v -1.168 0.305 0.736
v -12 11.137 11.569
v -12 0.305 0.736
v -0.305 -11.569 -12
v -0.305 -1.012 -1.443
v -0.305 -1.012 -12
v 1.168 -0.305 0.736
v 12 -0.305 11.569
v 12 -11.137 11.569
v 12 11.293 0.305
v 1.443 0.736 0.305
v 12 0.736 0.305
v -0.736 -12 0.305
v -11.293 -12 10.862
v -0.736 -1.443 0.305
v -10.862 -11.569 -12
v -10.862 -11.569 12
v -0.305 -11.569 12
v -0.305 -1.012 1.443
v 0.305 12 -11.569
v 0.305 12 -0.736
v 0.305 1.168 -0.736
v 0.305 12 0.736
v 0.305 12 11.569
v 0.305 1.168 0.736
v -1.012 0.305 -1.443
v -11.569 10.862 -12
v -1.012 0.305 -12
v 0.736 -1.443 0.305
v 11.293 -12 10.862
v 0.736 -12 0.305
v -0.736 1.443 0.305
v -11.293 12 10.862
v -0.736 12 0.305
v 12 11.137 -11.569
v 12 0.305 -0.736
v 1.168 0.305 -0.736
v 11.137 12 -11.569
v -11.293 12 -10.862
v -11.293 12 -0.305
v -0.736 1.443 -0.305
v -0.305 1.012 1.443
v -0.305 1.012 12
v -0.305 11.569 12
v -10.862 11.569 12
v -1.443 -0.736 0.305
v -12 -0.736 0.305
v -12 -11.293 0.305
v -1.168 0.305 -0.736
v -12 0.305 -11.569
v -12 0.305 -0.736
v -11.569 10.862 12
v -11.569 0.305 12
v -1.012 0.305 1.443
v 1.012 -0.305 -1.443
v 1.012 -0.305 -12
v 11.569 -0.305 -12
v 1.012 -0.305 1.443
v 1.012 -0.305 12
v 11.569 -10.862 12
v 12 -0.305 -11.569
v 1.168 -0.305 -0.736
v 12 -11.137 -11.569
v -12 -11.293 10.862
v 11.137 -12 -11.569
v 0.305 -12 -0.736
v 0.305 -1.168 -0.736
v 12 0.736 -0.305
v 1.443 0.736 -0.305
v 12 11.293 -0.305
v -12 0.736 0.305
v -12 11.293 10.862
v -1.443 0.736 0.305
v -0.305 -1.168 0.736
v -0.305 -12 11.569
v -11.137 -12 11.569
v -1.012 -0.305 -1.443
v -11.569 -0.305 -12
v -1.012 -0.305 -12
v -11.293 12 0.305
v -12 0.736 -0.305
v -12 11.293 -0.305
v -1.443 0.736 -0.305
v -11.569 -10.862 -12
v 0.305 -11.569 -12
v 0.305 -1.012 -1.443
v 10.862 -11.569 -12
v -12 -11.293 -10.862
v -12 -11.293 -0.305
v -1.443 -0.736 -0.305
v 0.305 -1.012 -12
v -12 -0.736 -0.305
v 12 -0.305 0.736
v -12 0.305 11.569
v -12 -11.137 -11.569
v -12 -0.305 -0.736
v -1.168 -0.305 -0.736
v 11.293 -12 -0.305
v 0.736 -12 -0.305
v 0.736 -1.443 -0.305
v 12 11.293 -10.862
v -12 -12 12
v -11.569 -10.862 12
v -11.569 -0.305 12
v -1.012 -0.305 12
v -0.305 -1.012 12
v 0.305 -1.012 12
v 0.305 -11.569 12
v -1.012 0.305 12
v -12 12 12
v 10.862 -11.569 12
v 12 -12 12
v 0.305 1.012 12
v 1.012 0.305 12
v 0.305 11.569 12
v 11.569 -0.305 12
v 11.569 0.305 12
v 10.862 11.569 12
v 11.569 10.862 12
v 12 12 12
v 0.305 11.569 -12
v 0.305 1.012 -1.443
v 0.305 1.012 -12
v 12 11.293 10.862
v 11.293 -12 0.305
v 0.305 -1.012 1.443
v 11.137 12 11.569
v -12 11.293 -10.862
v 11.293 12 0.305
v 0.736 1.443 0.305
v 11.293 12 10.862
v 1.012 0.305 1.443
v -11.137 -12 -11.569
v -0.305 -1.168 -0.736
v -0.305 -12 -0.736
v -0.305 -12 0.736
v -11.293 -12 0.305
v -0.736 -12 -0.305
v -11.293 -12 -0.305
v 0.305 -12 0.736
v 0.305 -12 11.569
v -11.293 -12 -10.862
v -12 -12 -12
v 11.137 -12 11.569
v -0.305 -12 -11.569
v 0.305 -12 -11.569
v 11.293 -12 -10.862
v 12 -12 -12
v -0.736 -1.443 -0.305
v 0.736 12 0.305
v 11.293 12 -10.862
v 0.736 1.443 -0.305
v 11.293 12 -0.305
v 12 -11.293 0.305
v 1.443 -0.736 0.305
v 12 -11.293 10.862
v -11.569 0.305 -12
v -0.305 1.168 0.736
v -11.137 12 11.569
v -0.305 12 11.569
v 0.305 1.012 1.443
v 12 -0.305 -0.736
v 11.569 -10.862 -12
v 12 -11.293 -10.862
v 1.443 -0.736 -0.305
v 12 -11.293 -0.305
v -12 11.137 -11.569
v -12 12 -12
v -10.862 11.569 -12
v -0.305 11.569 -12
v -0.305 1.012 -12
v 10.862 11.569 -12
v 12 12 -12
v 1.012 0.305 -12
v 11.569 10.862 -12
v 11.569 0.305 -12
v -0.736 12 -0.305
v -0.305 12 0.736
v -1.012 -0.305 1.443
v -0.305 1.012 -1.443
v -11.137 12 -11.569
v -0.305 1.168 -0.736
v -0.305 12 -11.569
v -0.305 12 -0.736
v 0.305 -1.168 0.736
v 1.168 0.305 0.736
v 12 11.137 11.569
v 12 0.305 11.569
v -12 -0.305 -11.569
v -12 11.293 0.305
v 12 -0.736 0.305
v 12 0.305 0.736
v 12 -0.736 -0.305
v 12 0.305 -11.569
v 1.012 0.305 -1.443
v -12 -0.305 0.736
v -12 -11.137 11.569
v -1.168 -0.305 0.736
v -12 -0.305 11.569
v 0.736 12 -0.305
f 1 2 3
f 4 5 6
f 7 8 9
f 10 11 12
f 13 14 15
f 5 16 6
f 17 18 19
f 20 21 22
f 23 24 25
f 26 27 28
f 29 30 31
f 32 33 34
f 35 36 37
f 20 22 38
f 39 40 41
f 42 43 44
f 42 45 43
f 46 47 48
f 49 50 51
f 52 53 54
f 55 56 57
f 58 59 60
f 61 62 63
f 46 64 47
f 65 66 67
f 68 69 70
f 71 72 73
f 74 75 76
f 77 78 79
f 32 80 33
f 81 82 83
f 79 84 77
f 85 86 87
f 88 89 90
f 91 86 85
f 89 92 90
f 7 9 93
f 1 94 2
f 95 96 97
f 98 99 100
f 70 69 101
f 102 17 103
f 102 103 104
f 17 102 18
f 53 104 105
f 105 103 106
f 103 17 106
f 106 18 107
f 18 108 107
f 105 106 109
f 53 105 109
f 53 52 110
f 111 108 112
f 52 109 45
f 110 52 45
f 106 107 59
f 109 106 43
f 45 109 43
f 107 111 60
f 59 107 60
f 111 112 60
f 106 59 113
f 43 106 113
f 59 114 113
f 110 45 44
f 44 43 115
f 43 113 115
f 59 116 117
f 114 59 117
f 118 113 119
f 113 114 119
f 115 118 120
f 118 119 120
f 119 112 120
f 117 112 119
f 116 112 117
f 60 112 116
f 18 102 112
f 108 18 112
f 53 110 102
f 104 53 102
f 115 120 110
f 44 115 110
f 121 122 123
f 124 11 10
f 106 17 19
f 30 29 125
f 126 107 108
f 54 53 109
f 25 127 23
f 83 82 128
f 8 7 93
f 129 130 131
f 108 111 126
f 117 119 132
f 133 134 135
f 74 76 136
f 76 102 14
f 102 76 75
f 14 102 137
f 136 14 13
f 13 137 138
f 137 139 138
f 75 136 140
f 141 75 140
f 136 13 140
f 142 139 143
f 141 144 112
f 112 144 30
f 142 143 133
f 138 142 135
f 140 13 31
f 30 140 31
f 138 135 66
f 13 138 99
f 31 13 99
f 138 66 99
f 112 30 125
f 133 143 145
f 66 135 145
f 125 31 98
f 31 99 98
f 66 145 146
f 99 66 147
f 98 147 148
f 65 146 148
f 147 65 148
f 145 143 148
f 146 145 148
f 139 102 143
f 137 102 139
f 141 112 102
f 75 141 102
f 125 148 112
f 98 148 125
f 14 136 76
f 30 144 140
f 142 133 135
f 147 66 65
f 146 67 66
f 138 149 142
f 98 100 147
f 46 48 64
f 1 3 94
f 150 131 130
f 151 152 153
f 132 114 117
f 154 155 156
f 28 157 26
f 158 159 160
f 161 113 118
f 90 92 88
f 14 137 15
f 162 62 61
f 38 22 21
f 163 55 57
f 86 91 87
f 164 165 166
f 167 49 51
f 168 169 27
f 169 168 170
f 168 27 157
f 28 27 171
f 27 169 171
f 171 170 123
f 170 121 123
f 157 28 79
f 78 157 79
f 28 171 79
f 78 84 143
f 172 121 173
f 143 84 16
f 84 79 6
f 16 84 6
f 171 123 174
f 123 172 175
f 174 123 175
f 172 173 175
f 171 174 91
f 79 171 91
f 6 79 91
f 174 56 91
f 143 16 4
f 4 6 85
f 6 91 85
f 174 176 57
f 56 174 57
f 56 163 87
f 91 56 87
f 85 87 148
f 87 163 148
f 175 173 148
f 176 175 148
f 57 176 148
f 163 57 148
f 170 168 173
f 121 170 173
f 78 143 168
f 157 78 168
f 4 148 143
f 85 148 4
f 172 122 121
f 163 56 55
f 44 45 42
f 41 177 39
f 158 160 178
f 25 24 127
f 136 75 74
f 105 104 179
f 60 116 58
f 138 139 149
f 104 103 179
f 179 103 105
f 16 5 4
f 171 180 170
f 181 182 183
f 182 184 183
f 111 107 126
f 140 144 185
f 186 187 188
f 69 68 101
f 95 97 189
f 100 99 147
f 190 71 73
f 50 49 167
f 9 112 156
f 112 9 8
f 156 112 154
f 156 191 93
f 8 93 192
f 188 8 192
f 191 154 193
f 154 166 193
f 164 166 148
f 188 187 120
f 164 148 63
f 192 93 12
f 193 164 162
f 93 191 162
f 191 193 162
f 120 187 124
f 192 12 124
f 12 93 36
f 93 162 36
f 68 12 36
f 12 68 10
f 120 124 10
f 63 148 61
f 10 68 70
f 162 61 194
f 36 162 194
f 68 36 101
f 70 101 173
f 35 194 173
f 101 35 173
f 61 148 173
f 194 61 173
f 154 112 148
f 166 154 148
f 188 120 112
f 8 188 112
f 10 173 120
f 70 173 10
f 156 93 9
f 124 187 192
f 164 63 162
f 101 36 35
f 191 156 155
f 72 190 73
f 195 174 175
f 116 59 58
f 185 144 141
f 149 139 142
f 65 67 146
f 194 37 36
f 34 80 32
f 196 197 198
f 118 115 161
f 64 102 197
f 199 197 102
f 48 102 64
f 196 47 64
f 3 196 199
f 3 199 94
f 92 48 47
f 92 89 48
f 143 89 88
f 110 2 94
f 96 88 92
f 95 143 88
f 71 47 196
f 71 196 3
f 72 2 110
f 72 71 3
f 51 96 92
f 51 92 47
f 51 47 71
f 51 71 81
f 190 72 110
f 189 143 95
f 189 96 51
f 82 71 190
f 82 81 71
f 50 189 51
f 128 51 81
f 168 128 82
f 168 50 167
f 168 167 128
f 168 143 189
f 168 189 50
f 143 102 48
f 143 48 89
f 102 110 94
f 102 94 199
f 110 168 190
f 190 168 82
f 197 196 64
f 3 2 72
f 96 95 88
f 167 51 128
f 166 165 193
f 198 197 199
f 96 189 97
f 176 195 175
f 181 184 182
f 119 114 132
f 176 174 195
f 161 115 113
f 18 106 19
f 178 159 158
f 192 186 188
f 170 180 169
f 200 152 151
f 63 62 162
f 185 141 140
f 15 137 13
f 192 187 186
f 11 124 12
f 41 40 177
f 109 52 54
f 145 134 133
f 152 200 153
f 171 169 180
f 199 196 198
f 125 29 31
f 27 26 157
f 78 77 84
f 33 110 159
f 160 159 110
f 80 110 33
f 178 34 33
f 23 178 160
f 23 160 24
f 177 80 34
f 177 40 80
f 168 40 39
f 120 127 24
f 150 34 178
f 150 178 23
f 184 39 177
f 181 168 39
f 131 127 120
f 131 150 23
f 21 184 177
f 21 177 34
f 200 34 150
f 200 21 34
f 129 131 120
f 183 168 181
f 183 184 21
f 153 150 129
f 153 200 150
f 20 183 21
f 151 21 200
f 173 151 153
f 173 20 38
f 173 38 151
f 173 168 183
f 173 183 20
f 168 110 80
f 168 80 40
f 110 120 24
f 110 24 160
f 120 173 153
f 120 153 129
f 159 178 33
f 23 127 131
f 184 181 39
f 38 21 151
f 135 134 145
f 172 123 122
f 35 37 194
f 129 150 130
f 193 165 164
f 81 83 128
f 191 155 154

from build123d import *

# Parameters (mm, degrees)
SKETCH2_W               = 25
SKETCH2_H               = 25
BOSS_EXTRUDE1_DEPTH     = 0.305
SKETCH3_W               = 25
SKETCH3_H               = 25
BOSS_EXTRUDE2_DEPTH     = 0.305
SKETCH4_W               = 25
SKETCH4_H               = 25
BOSS_EXTRUDE3_DEPTH     = 0.305
BOSS_EXTRUDE4_DEPTH     = 0.305
CIRPATTERN1_COUNT       = 4
BOSS_EXTRUDE5_DEPTH     = 0.5
CIRPATTERN3_COUNT       = 4
CUT_EXTRUDE1_DEPTH      = 32.084683695
CUT_EXTRUDE1_DEPTH_BACK = 32.084683695
SKETCH10_W              = 32.20248022
SKETCH10_H              = 30.281091186
SKETCH10_W_2            = 24
SKETCH10_H_2            = 24
SKETCH11_W              = 28.880121396
SKETCH11_H              = 26.658573596
SKETCH11_W_2            = 24
SKETCH11_H_2            = 24
CUT_EXTRUDE2_DEPTH      = 37


with BuildPart() as part:
    # Sketch2 → Boss-Extrude1 (new, symmetric)
    with BuildSketch(Plane.XY):
        Rectangle(SKETCH2_W, SKETCH2_H)
    extrude(amount=BOSS_EXTRUDE1_DEPTH, both=True)

    # Sketch3 → Boss-Extrude2 (add, symmetric)
    with BuildSketch(Plane(origin=(0, 0, 0), x_dir=(1, 0, 0), z_dir=(0, 1, 0))):
        Rectangle(SKETCH3_W, SKETCH3_H)
    extrude(amount=BOSS_EXTRUDE2_DEPTH, both=True)

    # Sketch4 → Boss-Extrude3 (add, symmetric)
    with BuildSketch(Plane(origin=(0, 0, 0), x_dir=(0, 0, -1), z_dir=(1, 0, 0))):
        Rectangle(SKETCH4_W, SKETCH4_H)
    extrude(amount=BOSS_EXTRUDE3_DEPTH, both=True)

    # 3DSketch1 → Boss-Extrude4 (add, symmetric)
    with BuildSketch(Plane(origin=(12.5, 12.5, -12.5), x_dir=(-0.5773502691896257, -0.5773502691896257, 0.5773502691896257), z_dir=(0.7071067811865476, 0, 0.7071067811865475))):
        Polygon((0, 0), (14.43375673, 20.412414523), (43.301270189, 0), (28.867513459, -20.412414523), align=None)
    boss_extrude4 = extrude(amount=BOSS_EXTRUDE4_DEPTH, both=True)

    # CirPattern1: Boss-Extrude4 ×4 about axis
    cirpattern1_axis = Axis((0, 0, -14.139022115), (0, 0, 1))
    for i in range(1, CIRPATTERN1_COUNT):
        add(boss_extrude4.rotate(cirpattern1_axis, i * 360 / CIRPATTERN1_COUNT))


with BuildPart() as body_2:
    # 3DSketch2 → Boss-Extrude5 (new, symmetric)
    with BuildSketch(Plane(origin=(12.5, -12.5, -12.5), x_dir=(-0.5773502691896257, 0.5773502691896257, 0.5773502691896257), z_dir=(-0.7071067811865476, -0.7071067811865476, 0))):
        Polygon((0, 0), (28.867513459, 20.412414523), (43.301270189, 0), (14.43375673, -20.412414523), align=None)
    boss_extrude5 = extrude(amount=BOSS_EXTRUDE5_DEPTH, both=True)

    # CirPattern3: Boss-Extrude5 ×4 about axis
    cirpattern3_axis = Axis((0, 0, -14.139022115), (0, 0, 1))
    for i in range(1, CIRPATTERN3_COUNT):
        add(boss_extrude5.rotate(cirpattern3_axis, i * 360 / CIRPATTERN3_COUNT))


with BuildPart() as part_1:
    add(part.part)

    # Combine1: union body 2
    add(body_2.part)

    # Sketch10 → Cut-Extrude1 (cut, two sides: drawn at the far end of the back side and taken through both)
    with BuildSketch(Plane.XY.offset(12.5).offset(-CUT_EXTRUDE1_DEPTH_BACK)):
        Rectangle(SKETCH10_W, SKETCH10_H)
        Rectangle(SKETCH10_W_2, SKETCH10_H_2, mode=Mode.SUBTRACT)
    extrude(amount=CUT_EXTRUDE1_DEPTH + CUT_EXTRUDE1_DEPTH_BACK, mode=Mode.SUBTRACT)

    # Sketch11 → Cut-Extrude2 (cut)
    with BuildSketch(Plane(origin=(12, 0, 0), x_dir=(0, 0, -1), z_dir=(1, 0, 0))):
        Rectangle(SKETCH11_W, SKETCH11_H)
        Rectangle(SKETCH11_W_2, SKETCH11_H_2, mode=Mode.SUBTRACT)
    extrude(amount=-CUT_EXTRUDE2_DEPTH, mode=Mode.SUBTRACT)


solid = part_1.part
